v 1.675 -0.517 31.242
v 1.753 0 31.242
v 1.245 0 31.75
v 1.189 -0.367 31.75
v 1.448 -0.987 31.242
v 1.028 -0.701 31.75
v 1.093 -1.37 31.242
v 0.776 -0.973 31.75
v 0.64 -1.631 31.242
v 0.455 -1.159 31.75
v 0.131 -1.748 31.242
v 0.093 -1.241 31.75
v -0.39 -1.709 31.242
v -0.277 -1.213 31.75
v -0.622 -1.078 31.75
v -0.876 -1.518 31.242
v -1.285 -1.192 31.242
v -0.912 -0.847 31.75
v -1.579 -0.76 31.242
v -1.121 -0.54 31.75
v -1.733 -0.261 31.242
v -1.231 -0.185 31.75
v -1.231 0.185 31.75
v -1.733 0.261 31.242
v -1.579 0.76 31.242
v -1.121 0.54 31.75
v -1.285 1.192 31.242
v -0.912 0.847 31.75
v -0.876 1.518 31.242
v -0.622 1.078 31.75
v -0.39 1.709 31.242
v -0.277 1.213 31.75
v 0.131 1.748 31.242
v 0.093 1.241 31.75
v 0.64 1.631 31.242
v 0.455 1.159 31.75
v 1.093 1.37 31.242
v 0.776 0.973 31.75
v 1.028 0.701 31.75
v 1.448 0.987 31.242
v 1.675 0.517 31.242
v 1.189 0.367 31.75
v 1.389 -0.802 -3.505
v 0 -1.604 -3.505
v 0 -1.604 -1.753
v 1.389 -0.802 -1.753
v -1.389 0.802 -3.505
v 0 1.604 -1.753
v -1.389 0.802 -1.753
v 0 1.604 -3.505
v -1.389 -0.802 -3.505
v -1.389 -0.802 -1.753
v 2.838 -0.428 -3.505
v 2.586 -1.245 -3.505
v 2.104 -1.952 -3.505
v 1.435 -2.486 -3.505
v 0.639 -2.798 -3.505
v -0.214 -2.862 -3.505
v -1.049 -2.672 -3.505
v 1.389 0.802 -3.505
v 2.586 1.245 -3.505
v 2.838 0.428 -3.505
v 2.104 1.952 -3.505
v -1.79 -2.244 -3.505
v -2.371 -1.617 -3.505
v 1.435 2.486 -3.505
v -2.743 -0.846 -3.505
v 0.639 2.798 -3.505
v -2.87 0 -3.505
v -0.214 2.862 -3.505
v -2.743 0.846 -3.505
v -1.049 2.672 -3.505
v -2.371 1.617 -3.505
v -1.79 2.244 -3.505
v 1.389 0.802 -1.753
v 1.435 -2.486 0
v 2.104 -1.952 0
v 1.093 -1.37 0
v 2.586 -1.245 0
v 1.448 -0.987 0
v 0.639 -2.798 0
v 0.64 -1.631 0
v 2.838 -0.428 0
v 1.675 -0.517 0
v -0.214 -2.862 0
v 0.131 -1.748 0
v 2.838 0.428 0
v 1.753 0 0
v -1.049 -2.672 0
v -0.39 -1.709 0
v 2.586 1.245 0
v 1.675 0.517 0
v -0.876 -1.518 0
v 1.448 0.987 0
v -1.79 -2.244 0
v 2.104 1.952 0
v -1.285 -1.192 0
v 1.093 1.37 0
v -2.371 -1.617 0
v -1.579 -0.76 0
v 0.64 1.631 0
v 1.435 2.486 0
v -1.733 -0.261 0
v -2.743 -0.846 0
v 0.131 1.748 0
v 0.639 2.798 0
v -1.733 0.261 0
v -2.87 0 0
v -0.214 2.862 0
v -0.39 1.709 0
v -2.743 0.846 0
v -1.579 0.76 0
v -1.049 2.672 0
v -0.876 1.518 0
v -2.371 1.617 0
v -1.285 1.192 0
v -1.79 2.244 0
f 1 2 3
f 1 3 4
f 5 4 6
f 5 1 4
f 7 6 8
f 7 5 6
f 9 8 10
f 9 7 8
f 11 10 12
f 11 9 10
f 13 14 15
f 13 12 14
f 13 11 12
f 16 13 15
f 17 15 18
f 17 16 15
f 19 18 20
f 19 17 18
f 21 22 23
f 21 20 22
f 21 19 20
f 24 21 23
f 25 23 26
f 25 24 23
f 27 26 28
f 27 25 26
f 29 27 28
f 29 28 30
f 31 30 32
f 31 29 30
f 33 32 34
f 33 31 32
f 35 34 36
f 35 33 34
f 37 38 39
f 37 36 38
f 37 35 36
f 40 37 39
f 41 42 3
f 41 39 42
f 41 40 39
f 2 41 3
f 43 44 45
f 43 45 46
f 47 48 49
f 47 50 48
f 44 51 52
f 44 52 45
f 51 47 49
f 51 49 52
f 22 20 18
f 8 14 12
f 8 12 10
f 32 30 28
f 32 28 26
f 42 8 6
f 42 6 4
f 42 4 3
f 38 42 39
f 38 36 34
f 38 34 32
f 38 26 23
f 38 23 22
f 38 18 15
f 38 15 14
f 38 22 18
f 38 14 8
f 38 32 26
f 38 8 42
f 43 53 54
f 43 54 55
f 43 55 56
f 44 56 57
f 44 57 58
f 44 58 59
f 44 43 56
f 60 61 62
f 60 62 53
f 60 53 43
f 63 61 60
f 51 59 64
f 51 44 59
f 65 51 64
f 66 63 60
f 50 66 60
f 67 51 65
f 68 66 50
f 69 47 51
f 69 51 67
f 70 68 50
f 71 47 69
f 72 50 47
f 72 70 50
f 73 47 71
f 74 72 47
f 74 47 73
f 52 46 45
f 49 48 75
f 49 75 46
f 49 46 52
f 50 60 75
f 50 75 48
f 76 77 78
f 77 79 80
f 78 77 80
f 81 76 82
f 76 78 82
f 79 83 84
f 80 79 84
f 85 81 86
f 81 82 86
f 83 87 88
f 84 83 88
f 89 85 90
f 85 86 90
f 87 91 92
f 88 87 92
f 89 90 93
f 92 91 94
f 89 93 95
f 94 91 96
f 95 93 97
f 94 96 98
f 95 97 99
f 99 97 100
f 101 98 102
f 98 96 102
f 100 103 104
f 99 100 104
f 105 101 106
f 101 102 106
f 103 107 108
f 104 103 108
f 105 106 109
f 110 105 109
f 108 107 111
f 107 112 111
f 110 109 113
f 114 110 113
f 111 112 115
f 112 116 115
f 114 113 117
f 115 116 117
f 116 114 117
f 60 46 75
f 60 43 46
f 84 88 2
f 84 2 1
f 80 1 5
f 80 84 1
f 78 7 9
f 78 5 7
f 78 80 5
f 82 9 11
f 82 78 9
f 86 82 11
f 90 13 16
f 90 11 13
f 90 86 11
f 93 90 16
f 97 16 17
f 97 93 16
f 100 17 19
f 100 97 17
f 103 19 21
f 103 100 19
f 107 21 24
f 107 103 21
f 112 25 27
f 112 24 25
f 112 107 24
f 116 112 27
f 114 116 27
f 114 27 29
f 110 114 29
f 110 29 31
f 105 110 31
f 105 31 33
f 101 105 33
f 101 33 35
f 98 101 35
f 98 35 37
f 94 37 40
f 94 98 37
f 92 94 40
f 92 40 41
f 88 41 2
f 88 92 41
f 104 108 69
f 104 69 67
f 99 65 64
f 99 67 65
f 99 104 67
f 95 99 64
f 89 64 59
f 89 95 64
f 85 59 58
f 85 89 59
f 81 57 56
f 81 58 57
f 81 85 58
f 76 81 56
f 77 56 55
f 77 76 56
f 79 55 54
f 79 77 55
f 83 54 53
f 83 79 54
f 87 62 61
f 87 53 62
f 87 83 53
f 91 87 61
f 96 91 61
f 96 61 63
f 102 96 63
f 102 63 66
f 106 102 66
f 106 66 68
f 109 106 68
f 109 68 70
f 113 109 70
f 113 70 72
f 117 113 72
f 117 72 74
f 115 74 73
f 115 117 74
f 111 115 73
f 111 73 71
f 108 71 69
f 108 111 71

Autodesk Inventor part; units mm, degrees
ref_plane "YZ Plane" through (0, 0, 0) normal (1, 0, 0) x (0, 1, 0)
ref_plane "XZ Plane" through (0, 0, 0) normal (0, 1, 0) x (-1, 0, 0)
ref_plane "XY Plane" through (0, 0, 0) normal (0, 0, 1) x (1, 0, 0)
sketch "Sketch1" plane through (0, 0, 0) normal (0, 0, 1) x (1, 0, 0)
  circle A0 centre (0, 0) radius 1.7526
  dimension "d0" = 3.5052
extrude "Extrusion1" add sketch "Sketch1" along normal blind 31.75
sketch "Sketch2" plane through (0, 0, 0) normal (0, 0, -1) x (-1, 0, 0)
  circle A0 centre (0, 0) radius 1.7526 construction
  circle A1 centre (0, 0) radius 2.8702
  dimension "d3" = 5.7404
extrude "Extrusion2" add sketch "Sketch2" along normal blind 3.5052
sketch "Sketch3" plane through (0, 0, -3.5052) normal (0, 0, -1) x (-1, 0, 0)
  circle A0 centre (0, 0) radius 2.8702 projected
  line L0 (0, 1.604) -> (1.3891, 0.802)
  line L1 (1.3891, 0.802) -> (1.3891, -0.802)
  line L2 (1.3891, -0.802) -> (0, -1.604)
  line L3 (0, -1.604) -> (-1.3891, -0.802)
  line L4 (-1.3891, -0.802) -> (-1.3891, 0.802)
  line L5 (-1.3891, 0.802) -> (0, 1.604)
  dimension "d6" = 2.7781
extrude "Extrusion3" cut sketch "Sketch3" against normal blind 1.7526 contours L0 L1 L2 L3 L4 L5
chamfer "Chamfer1" distance 0.508 angle 45 1 edges at (-1.7526, 0, 31.75)
thread "Thread2" size "6-32 UNC" class "2A" standard "ANSI Unified Screw Threads" length 25.4
properties part number "6-32 SHCS x1250" material "Stainless Steel"
